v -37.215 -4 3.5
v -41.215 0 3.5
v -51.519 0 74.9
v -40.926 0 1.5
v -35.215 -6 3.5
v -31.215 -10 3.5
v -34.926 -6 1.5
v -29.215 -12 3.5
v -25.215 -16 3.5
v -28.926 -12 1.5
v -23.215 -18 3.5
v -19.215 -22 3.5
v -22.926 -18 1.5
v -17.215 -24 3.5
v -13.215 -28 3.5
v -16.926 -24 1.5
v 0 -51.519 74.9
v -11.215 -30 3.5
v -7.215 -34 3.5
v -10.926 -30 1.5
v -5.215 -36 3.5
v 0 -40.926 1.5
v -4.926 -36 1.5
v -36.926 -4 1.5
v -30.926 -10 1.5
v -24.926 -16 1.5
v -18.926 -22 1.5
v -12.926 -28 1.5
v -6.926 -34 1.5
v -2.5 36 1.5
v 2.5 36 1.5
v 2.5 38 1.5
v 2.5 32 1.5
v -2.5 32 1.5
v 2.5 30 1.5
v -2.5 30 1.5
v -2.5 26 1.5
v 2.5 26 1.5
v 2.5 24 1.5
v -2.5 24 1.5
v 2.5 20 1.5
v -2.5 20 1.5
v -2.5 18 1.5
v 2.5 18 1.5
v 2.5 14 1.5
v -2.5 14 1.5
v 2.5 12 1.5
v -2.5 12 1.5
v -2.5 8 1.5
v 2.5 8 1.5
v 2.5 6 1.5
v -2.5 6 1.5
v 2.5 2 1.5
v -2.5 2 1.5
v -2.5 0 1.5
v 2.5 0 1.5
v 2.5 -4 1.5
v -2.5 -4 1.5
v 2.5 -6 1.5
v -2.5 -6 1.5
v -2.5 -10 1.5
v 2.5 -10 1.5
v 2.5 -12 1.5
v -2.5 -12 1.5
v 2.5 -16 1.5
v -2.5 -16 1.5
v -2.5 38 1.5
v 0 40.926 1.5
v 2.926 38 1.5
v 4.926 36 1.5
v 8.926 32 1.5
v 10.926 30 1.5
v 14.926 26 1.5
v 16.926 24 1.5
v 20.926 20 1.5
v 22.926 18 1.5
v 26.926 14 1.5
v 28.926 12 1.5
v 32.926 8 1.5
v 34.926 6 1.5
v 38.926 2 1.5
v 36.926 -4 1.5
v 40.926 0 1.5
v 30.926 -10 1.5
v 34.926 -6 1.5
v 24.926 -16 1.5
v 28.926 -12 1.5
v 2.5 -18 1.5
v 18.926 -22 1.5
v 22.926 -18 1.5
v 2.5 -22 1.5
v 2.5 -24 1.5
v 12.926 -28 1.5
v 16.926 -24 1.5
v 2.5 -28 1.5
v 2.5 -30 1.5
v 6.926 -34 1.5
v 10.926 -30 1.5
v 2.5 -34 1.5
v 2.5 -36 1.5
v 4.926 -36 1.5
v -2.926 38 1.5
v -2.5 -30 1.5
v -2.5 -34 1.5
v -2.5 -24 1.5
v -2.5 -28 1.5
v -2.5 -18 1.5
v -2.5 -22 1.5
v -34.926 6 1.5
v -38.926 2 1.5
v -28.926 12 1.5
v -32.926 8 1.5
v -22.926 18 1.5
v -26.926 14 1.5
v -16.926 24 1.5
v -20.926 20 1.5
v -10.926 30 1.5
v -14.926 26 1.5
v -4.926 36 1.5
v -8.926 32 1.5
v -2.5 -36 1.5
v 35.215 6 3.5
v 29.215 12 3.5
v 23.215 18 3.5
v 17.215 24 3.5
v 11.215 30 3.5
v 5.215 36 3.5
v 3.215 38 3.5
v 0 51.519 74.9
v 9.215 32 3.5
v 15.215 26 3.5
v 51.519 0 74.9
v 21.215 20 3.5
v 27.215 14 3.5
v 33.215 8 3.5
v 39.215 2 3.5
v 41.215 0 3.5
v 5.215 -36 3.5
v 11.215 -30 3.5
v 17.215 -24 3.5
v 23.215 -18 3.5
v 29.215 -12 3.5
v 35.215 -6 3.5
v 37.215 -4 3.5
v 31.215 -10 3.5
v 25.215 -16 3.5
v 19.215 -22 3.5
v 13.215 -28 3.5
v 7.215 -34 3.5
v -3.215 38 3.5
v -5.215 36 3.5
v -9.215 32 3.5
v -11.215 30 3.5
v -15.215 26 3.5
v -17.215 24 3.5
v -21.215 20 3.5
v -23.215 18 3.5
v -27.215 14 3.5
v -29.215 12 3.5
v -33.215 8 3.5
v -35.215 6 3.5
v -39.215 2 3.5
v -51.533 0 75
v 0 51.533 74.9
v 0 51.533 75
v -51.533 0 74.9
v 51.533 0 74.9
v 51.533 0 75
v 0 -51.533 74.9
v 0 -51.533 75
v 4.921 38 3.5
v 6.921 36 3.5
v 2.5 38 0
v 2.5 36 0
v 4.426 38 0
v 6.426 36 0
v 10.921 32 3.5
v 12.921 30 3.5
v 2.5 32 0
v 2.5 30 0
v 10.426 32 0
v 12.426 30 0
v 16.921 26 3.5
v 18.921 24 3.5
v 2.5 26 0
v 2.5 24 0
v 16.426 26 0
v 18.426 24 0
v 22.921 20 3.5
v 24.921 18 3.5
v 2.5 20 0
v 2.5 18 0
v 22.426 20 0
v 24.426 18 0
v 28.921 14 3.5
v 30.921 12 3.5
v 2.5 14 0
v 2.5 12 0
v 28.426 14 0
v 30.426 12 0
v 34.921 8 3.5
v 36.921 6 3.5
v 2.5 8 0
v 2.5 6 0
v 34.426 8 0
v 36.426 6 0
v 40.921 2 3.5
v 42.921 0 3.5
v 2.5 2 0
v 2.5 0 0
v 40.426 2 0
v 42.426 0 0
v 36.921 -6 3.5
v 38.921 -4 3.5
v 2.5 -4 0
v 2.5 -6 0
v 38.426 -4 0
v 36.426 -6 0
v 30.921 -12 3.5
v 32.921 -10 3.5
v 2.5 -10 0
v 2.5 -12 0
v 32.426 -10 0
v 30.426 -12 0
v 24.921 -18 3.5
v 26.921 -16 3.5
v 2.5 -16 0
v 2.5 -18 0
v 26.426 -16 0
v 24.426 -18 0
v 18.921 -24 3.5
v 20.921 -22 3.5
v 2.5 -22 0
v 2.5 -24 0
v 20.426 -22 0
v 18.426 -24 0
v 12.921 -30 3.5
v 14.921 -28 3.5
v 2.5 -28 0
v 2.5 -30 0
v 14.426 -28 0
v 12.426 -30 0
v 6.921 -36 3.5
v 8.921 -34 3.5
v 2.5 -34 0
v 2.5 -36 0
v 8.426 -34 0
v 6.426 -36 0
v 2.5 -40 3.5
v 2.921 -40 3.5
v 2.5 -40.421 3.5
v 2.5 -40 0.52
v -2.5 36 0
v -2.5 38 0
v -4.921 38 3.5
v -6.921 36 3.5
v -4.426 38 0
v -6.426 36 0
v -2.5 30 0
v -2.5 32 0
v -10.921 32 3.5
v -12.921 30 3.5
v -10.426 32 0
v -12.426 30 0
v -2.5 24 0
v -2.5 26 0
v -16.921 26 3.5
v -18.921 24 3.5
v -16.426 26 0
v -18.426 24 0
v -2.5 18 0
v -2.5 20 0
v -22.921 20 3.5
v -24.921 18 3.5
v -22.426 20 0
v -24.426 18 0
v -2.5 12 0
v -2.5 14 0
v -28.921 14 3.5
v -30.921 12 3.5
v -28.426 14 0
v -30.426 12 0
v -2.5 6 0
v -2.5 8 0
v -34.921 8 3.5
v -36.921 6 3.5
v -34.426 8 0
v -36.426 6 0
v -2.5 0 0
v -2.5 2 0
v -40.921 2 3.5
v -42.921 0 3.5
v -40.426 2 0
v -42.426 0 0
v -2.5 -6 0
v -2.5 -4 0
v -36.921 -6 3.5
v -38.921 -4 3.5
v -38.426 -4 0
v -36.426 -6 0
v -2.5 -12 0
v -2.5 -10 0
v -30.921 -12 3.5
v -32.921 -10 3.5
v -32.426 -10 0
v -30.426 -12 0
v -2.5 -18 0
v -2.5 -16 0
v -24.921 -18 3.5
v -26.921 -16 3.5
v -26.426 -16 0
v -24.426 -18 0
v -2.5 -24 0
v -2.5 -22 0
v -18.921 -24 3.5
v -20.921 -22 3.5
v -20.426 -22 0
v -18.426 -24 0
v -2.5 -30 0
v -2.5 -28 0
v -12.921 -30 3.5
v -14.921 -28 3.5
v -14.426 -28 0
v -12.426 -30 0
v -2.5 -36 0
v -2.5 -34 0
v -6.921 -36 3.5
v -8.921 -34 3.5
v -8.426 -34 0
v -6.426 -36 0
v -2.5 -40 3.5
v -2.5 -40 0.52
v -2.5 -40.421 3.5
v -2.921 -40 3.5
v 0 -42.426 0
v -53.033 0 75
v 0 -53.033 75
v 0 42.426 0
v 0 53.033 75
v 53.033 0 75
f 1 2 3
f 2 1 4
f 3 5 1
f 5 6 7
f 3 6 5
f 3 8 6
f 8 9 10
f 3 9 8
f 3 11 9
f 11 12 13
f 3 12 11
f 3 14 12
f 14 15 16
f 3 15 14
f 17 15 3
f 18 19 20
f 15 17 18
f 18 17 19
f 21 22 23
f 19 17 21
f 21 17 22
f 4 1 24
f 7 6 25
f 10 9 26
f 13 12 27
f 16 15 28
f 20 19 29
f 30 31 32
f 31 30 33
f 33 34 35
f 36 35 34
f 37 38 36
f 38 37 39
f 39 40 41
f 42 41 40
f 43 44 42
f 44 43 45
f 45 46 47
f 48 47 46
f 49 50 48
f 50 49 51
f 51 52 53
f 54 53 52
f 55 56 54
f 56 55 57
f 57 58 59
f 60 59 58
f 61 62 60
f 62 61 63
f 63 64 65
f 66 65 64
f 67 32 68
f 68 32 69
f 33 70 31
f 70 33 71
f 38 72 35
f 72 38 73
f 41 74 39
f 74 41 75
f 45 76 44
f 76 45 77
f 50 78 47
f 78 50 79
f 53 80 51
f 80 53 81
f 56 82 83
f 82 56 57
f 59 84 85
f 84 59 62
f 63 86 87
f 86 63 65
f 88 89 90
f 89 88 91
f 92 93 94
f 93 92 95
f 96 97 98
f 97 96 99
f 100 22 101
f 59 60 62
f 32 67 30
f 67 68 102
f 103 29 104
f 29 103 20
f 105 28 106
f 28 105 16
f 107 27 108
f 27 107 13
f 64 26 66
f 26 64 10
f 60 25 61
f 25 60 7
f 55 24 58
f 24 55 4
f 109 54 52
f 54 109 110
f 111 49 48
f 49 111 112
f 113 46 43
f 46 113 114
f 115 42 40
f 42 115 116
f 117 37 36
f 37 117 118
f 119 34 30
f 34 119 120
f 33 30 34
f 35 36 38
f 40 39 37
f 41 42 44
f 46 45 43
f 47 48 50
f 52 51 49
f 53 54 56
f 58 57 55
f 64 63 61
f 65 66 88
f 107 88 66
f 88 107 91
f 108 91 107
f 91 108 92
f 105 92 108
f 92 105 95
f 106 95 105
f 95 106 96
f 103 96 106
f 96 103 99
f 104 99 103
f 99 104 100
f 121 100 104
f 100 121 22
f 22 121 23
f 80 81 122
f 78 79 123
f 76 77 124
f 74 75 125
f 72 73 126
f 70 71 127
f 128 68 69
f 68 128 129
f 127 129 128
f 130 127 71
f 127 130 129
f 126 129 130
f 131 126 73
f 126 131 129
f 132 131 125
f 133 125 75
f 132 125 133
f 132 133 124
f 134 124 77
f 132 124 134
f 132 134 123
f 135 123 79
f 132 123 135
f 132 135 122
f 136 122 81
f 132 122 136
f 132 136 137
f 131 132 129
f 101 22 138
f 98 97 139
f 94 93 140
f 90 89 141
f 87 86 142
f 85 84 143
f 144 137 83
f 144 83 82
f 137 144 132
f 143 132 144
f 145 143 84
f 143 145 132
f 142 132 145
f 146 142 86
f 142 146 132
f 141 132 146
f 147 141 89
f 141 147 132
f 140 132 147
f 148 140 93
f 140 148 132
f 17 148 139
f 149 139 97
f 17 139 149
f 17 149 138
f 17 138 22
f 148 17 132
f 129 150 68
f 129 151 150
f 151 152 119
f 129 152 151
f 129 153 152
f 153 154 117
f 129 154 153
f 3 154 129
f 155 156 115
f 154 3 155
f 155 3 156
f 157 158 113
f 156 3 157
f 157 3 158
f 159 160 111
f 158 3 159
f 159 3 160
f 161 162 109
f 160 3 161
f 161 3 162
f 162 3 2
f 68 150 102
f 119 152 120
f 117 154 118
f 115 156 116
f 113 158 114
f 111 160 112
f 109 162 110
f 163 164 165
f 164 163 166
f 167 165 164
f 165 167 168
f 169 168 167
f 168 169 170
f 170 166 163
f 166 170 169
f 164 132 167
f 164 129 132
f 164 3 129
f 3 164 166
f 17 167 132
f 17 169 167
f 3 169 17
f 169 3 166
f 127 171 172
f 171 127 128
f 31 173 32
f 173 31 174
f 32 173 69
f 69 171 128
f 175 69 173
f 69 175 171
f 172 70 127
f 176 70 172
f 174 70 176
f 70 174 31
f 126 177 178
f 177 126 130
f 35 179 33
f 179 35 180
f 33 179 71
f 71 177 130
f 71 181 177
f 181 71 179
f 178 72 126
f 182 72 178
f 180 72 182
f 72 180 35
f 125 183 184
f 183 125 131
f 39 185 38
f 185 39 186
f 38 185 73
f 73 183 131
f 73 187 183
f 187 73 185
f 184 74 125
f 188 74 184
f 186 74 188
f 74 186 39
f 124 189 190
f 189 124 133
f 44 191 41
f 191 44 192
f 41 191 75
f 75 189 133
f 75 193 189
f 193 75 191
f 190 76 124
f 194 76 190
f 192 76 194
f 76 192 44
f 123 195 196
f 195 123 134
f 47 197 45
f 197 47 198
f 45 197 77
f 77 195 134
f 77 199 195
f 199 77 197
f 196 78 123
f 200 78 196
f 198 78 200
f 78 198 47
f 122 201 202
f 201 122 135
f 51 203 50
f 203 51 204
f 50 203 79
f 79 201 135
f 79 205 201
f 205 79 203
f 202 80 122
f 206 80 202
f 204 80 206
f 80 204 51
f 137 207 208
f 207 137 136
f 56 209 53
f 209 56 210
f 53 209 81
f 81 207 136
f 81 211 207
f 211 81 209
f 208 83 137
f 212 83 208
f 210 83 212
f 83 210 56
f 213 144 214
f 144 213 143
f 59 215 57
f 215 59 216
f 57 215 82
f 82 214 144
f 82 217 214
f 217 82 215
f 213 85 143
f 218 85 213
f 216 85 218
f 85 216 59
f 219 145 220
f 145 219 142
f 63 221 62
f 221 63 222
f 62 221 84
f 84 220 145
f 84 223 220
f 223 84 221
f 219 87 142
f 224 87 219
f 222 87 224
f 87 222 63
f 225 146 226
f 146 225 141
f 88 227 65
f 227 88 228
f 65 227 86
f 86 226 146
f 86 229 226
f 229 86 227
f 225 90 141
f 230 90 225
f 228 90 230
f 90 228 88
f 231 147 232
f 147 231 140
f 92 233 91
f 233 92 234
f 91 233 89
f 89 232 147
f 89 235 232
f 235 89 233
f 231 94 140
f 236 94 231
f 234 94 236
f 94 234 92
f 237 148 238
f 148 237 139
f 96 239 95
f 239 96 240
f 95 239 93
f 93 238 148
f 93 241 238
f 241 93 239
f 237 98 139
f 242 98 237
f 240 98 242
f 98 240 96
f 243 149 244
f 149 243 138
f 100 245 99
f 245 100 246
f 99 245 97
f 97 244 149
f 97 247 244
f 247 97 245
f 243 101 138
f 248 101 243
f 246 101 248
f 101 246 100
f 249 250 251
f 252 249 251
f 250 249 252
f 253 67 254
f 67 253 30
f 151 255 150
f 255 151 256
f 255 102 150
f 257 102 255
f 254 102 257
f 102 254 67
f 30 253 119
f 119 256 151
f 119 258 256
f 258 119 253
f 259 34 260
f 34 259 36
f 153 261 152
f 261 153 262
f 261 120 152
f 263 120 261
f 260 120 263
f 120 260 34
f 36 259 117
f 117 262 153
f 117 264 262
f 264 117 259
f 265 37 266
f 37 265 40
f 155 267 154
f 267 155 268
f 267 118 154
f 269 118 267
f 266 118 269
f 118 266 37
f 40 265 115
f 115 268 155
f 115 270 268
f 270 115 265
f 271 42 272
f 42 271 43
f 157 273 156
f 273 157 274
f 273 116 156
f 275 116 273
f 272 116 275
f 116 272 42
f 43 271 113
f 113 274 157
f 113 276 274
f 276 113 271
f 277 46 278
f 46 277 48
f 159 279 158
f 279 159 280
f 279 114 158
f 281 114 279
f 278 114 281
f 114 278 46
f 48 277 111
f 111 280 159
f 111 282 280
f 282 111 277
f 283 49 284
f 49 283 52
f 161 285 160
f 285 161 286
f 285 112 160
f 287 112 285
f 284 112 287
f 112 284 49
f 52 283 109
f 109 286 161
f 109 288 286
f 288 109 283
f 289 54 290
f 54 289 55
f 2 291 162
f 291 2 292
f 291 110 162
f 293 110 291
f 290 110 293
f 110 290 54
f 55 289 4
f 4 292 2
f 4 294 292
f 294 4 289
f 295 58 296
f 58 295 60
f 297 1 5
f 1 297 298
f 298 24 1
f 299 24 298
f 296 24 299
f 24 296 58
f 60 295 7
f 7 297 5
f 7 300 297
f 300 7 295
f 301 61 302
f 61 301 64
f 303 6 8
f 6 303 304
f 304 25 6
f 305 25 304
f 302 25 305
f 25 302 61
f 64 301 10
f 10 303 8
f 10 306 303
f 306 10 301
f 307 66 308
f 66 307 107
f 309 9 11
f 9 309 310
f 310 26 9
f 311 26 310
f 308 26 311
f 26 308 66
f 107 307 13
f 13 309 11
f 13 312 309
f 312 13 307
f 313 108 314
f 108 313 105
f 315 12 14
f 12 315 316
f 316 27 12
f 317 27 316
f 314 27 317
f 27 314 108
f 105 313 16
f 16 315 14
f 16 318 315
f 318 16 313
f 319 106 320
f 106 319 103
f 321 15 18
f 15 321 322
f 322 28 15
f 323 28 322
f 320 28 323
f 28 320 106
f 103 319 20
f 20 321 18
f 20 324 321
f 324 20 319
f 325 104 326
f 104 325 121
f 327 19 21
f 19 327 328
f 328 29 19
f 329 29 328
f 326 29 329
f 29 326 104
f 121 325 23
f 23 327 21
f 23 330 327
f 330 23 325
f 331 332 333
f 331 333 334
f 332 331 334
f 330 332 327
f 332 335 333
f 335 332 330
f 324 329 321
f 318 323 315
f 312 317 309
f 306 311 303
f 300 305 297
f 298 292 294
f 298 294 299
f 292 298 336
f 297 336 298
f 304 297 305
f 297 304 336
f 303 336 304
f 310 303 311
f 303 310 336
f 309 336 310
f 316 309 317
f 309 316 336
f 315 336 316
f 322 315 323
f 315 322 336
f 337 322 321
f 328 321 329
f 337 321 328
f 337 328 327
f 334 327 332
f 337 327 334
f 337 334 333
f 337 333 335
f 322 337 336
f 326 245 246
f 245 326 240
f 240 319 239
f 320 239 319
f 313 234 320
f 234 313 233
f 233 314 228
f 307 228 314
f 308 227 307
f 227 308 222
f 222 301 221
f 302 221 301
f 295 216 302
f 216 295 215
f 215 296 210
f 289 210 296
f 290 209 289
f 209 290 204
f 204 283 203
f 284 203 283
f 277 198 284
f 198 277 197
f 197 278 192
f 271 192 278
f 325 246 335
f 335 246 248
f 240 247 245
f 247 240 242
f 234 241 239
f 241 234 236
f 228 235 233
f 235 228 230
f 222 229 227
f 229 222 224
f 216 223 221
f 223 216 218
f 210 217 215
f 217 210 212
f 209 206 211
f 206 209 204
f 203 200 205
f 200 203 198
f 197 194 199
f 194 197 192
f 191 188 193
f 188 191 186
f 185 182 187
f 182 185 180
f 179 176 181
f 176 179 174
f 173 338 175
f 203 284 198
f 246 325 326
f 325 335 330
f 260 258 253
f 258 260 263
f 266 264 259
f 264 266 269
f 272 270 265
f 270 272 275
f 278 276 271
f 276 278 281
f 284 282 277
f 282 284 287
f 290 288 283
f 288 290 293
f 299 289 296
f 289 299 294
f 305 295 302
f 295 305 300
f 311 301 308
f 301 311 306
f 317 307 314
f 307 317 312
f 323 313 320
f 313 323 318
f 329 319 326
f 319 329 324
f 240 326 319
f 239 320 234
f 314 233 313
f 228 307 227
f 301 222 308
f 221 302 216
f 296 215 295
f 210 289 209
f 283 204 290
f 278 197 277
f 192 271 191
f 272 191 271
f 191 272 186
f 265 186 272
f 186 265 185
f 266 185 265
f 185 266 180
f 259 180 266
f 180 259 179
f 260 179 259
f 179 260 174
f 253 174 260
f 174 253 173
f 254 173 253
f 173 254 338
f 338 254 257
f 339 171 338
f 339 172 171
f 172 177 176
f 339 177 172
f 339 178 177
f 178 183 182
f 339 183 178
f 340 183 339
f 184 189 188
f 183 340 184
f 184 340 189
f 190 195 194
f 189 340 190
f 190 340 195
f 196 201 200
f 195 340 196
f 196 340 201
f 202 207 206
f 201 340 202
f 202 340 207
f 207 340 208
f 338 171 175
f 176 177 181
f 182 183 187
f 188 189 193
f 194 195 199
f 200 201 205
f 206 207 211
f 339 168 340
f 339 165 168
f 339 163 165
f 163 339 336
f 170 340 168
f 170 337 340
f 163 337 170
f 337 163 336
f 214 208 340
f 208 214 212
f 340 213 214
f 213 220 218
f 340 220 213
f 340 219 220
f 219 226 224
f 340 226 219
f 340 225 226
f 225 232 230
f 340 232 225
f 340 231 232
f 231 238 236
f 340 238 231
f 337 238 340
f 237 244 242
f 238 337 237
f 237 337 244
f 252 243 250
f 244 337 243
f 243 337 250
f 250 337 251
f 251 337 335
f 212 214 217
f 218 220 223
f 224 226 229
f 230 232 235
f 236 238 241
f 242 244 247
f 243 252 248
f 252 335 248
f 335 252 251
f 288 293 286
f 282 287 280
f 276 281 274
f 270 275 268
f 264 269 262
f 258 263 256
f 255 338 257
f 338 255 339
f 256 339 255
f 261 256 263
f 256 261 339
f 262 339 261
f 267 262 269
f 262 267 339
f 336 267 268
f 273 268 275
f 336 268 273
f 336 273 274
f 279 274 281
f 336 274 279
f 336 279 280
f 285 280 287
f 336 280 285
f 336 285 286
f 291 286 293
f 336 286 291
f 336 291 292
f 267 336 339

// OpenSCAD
// preview[view:north east, tilt:top]

// Shape
shape = 1; // [1:Square,0:Round]

// Size of bottom
bottom = 60; // [30:1:150]

// Size of top
top = 75; // [30:1:150]

// Height of flower pot
height = 75; // [30:1:150]

// How thick do you want the flower pot?
t = 1.5; // [1:0.1:5]

// Do you want perforation in the bottom?
holes = 1; // [1:Yes,0:No]

// Do you want a perforated wall?
perforate = 0; // [1:Yes,0:No]

// Do you want a brim?
brim = 0; // [1:Yes,0:No]

// Do you want feet? (NB! Experimental, need support when printing)
feet = 0; // [1:Yes,0:No]

/* [Hidden] */
detail = 10;
sqr2 = sqrt(2);

// Difference will construct a main shape and subtract cut outs
difference() {
  //***********
  // Main Shape
  //***********
    
  union(){    
    // Flower pot cup
    difference() {      
      
      // Flower pot solid
      union(){
          
        // Brim
        if (brim == 1) {
          translate([0,0,height-1]) {
            if (shape == 1) {
                cylinder(d1=top*sqr2+3,d2=top*sqr2+8,h=2,$fn=4);
              //}
            }
        
            if (shape == 0) {
              cylinder(d1=top+3,d2=top+8,h=2,$fn=60);
            }   
          }
        }
        
        // Main shape
        translate([0,0,0]) {
          if (shape == 1) {
            cylinder(d1=bottom*sqr2,d2=top*sqr2,h=height,$fn=4);
              
          if (feet == 1) {
            translate([bottom*sqr2/2-5,0,-5]) {
              cylinder(d1=10,d2=10,h=5,$fn=4);
            }
            
            translate([0,bottom*sqr2/2-5,-5]) {
              cylinder(d1=10,d2=10,h=5,$fn=4);
            }

            translate([-bottom*sqr2/2+5,0,-5]) {
              cylinder(d1=10,d2=10,h=5,$fn=4);
            }

            translate([0,-bottom*sqr2/2+5,-5]) {
              cylinder(d1=10,d2=10,h=5,$fn=4);
            }
            
            translate([0,0,-5]) {
              cylinder(d1=10,d2=10,h=5,$fn=4);
            }
            
            }

          }
          
          if (shape == 0) {
            cylinder(d1=bottom,d2=top,h=height,$fn=60);
              
             if (feet == 1) {
            translate([bottom/2-5,0,-5]) {
              cylinder(d1=10,d2=10,h=5,$fn=40);
            }
            
            translate([0,bottom/2-5,-5]) {
              cylinder(d1=10,d2=10,h=5,$fn=40);
            }

            translate([-bottom/2+5,0,-5]) {
              cylinder(d1=10,d2=10,h=5,$fn=40);
            }

            translate([0,-bottom/2+5,-5]) {
              cylinder(d1=10,d2=10,h=5,$fn=40);
            }
            
            translate([0,0,-5]) {
              cylinder(d1=10,d2=10,h=5,$fn=40);
            }
            
            }
              
          }
        }
        
        
        
      } // End Union
      
      union(){ // Union cut outs
          
      // Flower pot cut out
      translate([0,0,t]) {
        if (shape == 1) {
          cylinder(d1=bottom*sqr2-t*2,d2=top*sqr2-t*2,h=height-t,$fn=4);
          translate([0,0,height-t-0.1]) {
            cylinder(d1=top*sqr2-t*2,d2=top*sqr2-t*2,h=t*2+5,$fn=4);
          }
        }
        
        if (shape == 0) {
          cylinder(d1=bottom-t*2,d2=top-t*2,h=height-t,$fn=60);
          translate([0,0,height-t-0.1]) {
            cylinder(d1=top-t*2,d2=top-t*2,h=t*2+5,$fn=60);
          }
        }
        
      }
      
     //  translate([0,0,height-t]) {
     //    cylinder(d1=top*sqr2-t,d2=top*sqr2-t,h=t*2+5,$fn=4);
     //  }
      
      if (perforate == 1) {
      for (rotation =[0:600/bottom:360]) {
            rotate([0,0,rotation]) {
                translate([bottom/3,0,t+5]) {
                    rotate([0,0,0]) {
                        // Draw blades
                        cube([top,2,height/2-10],false);
                    } // End rotate
                } // End translate       
            } // End rotate
        } // End for spaceW
        
          for (rotation =[0:600/top:360]) {
            rotate([0,0,rotation]) {
                translate([top/3,0,height/2+2.5]) {
                    rotate([0,0,0]) {
                        // Draw blades
                        cube([top,2,height/2-10],false);
                    } // End rotate
                } // End translate       
            } // End rotate
        } // End for spaceW
        }
      
      // Holes in the bottom Part 1
      if (holes == 1) {
          for (spaceW =[-bottom:6:bottom]) {
            translate([2.5,-spaceW,-1]) {
              cube([bottom,2,t+3],false);
            } // End translate
          } // End for spaceW
      
      // Holes in the bottom Part 2
          for (spaceW =[-bottom:6:bottom]) {
            translate([-bottom-2.5,-spaceW,-1]) {
              cube([bottom,2,t+3],false);
            } // End translate
          } // End for spaceW
      } // End if holes
      
      } // End union cut outs
    } // End difference flower pot
  } // End union
} // End difference  
